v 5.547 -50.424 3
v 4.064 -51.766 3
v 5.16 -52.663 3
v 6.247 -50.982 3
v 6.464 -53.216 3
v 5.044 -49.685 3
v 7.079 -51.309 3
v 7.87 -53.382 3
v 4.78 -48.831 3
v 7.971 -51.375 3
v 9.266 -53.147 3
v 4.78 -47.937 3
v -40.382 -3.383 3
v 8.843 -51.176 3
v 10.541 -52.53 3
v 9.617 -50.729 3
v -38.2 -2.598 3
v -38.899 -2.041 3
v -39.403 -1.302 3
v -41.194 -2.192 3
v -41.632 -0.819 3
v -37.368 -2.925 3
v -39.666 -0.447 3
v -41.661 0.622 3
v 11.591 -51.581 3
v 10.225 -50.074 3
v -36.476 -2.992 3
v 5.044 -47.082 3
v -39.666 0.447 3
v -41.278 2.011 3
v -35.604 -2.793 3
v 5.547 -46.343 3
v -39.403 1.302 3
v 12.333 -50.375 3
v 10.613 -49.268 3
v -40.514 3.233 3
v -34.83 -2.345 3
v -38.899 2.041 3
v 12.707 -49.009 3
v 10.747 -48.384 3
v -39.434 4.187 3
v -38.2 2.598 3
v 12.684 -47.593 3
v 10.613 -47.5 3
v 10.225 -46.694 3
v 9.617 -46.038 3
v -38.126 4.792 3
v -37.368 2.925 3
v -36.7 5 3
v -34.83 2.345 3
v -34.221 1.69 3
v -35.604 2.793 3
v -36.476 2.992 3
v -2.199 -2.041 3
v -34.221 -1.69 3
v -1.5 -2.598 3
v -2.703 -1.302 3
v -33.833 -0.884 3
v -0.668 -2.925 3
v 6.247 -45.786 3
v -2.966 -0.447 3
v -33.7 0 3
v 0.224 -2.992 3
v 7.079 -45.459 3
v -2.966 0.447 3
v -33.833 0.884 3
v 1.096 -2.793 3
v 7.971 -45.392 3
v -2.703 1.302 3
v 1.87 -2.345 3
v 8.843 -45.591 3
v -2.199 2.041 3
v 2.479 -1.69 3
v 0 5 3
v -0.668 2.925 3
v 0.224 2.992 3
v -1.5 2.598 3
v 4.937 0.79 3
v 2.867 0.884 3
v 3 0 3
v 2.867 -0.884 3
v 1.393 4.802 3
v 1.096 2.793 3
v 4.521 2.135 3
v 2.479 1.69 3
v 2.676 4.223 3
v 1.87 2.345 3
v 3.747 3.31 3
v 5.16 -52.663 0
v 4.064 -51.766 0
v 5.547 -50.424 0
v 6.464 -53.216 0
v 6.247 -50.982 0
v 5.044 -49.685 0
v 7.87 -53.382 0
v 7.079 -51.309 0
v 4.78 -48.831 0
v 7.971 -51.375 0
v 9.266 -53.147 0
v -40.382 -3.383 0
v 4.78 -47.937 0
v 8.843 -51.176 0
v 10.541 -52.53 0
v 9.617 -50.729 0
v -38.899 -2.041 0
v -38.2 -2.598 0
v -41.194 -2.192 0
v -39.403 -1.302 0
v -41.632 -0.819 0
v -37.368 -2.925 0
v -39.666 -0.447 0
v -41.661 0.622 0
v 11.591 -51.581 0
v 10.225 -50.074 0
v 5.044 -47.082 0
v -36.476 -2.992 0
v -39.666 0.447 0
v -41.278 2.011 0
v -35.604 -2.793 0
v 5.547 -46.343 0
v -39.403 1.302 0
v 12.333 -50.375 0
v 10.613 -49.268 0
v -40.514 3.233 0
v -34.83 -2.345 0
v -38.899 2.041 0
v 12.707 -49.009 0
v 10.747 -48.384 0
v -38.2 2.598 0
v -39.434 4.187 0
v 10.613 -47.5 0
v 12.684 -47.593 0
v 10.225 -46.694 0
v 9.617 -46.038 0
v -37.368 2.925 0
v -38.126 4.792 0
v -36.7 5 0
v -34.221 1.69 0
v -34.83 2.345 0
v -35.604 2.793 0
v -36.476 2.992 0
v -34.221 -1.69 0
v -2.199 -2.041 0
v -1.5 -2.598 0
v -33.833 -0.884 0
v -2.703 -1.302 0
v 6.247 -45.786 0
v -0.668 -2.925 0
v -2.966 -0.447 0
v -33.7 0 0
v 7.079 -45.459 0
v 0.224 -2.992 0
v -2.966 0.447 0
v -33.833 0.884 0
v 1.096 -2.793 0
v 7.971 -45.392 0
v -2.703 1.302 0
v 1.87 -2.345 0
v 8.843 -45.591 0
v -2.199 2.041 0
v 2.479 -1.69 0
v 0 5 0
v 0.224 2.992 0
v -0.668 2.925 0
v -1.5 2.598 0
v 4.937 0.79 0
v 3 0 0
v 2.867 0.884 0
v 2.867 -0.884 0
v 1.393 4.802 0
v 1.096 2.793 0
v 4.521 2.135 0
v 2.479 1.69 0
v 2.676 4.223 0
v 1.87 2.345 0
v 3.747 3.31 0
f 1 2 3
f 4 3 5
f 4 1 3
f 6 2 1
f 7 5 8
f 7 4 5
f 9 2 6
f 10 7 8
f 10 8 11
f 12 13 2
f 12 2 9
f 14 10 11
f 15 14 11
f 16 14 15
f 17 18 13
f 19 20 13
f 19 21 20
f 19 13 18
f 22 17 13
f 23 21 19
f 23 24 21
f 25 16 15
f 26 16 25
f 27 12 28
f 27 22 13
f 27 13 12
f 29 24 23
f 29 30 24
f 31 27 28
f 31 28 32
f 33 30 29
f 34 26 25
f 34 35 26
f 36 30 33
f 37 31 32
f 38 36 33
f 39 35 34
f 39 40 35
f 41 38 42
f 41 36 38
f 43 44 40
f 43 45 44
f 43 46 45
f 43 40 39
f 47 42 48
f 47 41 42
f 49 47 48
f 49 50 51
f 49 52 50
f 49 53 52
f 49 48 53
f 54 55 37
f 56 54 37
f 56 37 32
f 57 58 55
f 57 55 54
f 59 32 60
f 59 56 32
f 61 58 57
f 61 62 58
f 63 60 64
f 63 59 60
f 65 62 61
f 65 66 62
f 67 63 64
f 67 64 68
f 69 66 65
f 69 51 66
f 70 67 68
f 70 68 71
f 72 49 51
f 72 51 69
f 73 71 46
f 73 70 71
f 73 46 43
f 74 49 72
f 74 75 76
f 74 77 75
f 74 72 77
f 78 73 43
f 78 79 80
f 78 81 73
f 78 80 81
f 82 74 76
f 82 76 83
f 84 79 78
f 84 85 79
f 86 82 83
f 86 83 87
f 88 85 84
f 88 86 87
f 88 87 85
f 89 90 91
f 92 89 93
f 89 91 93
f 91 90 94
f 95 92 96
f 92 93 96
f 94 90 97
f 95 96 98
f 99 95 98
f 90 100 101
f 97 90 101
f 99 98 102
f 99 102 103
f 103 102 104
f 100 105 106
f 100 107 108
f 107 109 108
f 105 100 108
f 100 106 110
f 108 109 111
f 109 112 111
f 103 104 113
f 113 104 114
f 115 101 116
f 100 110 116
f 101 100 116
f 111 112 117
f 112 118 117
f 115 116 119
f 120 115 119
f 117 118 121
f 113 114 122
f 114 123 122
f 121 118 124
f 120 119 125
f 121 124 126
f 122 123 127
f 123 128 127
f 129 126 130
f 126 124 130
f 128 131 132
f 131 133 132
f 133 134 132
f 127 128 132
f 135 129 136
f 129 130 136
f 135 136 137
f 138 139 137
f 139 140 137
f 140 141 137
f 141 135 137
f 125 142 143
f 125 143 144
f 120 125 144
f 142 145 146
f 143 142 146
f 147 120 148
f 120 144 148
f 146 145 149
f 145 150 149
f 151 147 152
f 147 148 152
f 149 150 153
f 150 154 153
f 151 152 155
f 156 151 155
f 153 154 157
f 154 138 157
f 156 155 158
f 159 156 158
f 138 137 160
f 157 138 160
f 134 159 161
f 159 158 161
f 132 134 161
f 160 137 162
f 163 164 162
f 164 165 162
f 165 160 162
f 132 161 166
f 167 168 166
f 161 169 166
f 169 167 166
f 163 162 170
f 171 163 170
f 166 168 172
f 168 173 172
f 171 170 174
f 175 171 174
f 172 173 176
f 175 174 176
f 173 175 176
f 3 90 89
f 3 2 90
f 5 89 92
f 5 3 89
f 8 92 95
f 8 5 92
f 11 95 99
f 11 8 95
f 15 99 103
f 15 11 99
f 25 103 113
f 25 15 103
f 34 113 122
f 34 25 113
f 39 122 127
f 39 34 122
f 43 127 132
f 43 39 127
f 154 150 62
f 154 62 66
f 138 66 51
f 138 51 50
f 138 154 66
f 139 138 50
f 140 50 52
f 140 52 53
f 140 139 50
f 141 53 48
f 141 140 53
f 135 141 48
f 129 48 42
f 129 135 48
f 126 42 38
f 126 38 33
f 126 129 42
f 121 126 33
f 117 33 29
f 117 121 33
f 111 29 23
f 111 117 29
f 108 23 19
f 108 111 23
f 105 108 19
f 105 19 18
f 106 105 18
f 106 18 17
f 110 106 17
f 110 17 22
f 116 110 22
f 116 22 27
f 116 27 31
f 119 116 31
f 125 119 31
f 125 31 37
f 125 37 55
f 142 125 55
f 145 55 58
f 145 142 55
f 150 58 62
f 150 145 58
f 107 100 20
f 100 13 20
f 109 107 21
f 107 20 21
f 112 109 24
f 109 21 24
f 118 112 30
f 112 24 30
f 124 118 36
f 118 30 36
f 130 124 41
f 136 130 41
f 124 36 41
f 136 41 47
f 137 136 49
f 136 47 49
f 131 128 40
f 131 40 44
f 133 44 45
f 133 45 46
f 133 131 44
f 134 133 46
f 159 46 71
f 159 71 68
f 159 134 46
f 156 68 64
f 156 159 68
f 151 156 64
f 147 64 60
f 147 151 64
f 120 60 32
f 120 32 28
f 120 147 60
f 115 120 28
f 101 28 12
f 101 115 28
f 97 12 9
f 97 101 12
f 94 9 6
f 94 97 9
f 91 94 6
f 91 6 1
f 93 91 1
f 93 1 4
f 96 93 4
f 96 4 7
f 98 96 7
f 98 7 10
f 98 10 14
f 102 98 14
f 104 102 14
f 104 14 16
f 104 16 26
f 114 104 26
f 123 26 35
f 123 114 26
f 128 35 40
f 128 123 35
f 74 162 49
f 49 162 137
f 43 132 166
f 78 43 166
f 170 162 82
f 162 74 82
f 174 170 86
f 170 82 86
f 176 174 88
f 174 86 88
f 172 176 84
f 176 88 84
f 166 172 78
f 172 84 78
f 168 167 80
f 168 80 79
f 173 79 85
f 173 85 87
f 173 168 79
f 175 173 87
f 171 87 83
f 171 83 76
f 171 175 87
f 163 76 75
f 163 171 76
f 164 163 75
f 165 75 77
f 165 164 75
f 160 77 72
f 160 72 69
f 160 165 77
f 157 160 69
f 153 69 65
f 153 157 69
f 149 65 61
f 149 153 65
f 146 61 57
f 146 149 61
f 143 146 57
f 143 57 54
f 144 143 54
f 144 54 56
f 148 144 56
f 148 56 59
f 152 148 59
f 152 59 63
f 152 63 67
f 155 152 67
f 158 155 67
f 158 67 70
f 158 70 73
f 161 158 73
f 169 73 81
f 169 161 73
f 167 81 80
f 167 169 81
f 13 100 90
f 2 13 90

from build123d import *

# Parameters (mm, degrees)
SKETCH_1_R      = 3
EXTRUDE_1_DEPTH = 3
FILLET_1_R      = 5


with BuildPart() as part:
    # ｽｹｯﾁ1 → ﾎﾞｽ - 押し出し1 (new body)
    with BuildSketch(Plane.XY):
        Polygon((-48.082594675, 5), (15.312222711, -64.010484178), (4.263144073, 5), align=None)
        with Locations((-36.7, 0)):
            Circle(SKETCH_1_R, mode=Mode.SUBTRACT)
        Circle(SKETCH_1_R, mode=Mode.SUBTRACT)
        with Locations((7.746594005, -48.38378118)):
            Circle(SKETCH_1_R, mode=Mode.SUBTRACT)
    extrude(amount=EXTRUDE_1_DEPTH)

    # ﾌｨﾚｯﾄ1
    fillet_1_edges = [part.edges().sort_by_distance(p)[0] for p in [
        (4.263144073, 5, 1.5),
        (15.312222711, -64.010484178, 1.5),
        (-48.082594675, 5, 1.5),
    ]]
    fillet(fillet_1_edges, radius=FILLET_1_R)


solid = part.part
